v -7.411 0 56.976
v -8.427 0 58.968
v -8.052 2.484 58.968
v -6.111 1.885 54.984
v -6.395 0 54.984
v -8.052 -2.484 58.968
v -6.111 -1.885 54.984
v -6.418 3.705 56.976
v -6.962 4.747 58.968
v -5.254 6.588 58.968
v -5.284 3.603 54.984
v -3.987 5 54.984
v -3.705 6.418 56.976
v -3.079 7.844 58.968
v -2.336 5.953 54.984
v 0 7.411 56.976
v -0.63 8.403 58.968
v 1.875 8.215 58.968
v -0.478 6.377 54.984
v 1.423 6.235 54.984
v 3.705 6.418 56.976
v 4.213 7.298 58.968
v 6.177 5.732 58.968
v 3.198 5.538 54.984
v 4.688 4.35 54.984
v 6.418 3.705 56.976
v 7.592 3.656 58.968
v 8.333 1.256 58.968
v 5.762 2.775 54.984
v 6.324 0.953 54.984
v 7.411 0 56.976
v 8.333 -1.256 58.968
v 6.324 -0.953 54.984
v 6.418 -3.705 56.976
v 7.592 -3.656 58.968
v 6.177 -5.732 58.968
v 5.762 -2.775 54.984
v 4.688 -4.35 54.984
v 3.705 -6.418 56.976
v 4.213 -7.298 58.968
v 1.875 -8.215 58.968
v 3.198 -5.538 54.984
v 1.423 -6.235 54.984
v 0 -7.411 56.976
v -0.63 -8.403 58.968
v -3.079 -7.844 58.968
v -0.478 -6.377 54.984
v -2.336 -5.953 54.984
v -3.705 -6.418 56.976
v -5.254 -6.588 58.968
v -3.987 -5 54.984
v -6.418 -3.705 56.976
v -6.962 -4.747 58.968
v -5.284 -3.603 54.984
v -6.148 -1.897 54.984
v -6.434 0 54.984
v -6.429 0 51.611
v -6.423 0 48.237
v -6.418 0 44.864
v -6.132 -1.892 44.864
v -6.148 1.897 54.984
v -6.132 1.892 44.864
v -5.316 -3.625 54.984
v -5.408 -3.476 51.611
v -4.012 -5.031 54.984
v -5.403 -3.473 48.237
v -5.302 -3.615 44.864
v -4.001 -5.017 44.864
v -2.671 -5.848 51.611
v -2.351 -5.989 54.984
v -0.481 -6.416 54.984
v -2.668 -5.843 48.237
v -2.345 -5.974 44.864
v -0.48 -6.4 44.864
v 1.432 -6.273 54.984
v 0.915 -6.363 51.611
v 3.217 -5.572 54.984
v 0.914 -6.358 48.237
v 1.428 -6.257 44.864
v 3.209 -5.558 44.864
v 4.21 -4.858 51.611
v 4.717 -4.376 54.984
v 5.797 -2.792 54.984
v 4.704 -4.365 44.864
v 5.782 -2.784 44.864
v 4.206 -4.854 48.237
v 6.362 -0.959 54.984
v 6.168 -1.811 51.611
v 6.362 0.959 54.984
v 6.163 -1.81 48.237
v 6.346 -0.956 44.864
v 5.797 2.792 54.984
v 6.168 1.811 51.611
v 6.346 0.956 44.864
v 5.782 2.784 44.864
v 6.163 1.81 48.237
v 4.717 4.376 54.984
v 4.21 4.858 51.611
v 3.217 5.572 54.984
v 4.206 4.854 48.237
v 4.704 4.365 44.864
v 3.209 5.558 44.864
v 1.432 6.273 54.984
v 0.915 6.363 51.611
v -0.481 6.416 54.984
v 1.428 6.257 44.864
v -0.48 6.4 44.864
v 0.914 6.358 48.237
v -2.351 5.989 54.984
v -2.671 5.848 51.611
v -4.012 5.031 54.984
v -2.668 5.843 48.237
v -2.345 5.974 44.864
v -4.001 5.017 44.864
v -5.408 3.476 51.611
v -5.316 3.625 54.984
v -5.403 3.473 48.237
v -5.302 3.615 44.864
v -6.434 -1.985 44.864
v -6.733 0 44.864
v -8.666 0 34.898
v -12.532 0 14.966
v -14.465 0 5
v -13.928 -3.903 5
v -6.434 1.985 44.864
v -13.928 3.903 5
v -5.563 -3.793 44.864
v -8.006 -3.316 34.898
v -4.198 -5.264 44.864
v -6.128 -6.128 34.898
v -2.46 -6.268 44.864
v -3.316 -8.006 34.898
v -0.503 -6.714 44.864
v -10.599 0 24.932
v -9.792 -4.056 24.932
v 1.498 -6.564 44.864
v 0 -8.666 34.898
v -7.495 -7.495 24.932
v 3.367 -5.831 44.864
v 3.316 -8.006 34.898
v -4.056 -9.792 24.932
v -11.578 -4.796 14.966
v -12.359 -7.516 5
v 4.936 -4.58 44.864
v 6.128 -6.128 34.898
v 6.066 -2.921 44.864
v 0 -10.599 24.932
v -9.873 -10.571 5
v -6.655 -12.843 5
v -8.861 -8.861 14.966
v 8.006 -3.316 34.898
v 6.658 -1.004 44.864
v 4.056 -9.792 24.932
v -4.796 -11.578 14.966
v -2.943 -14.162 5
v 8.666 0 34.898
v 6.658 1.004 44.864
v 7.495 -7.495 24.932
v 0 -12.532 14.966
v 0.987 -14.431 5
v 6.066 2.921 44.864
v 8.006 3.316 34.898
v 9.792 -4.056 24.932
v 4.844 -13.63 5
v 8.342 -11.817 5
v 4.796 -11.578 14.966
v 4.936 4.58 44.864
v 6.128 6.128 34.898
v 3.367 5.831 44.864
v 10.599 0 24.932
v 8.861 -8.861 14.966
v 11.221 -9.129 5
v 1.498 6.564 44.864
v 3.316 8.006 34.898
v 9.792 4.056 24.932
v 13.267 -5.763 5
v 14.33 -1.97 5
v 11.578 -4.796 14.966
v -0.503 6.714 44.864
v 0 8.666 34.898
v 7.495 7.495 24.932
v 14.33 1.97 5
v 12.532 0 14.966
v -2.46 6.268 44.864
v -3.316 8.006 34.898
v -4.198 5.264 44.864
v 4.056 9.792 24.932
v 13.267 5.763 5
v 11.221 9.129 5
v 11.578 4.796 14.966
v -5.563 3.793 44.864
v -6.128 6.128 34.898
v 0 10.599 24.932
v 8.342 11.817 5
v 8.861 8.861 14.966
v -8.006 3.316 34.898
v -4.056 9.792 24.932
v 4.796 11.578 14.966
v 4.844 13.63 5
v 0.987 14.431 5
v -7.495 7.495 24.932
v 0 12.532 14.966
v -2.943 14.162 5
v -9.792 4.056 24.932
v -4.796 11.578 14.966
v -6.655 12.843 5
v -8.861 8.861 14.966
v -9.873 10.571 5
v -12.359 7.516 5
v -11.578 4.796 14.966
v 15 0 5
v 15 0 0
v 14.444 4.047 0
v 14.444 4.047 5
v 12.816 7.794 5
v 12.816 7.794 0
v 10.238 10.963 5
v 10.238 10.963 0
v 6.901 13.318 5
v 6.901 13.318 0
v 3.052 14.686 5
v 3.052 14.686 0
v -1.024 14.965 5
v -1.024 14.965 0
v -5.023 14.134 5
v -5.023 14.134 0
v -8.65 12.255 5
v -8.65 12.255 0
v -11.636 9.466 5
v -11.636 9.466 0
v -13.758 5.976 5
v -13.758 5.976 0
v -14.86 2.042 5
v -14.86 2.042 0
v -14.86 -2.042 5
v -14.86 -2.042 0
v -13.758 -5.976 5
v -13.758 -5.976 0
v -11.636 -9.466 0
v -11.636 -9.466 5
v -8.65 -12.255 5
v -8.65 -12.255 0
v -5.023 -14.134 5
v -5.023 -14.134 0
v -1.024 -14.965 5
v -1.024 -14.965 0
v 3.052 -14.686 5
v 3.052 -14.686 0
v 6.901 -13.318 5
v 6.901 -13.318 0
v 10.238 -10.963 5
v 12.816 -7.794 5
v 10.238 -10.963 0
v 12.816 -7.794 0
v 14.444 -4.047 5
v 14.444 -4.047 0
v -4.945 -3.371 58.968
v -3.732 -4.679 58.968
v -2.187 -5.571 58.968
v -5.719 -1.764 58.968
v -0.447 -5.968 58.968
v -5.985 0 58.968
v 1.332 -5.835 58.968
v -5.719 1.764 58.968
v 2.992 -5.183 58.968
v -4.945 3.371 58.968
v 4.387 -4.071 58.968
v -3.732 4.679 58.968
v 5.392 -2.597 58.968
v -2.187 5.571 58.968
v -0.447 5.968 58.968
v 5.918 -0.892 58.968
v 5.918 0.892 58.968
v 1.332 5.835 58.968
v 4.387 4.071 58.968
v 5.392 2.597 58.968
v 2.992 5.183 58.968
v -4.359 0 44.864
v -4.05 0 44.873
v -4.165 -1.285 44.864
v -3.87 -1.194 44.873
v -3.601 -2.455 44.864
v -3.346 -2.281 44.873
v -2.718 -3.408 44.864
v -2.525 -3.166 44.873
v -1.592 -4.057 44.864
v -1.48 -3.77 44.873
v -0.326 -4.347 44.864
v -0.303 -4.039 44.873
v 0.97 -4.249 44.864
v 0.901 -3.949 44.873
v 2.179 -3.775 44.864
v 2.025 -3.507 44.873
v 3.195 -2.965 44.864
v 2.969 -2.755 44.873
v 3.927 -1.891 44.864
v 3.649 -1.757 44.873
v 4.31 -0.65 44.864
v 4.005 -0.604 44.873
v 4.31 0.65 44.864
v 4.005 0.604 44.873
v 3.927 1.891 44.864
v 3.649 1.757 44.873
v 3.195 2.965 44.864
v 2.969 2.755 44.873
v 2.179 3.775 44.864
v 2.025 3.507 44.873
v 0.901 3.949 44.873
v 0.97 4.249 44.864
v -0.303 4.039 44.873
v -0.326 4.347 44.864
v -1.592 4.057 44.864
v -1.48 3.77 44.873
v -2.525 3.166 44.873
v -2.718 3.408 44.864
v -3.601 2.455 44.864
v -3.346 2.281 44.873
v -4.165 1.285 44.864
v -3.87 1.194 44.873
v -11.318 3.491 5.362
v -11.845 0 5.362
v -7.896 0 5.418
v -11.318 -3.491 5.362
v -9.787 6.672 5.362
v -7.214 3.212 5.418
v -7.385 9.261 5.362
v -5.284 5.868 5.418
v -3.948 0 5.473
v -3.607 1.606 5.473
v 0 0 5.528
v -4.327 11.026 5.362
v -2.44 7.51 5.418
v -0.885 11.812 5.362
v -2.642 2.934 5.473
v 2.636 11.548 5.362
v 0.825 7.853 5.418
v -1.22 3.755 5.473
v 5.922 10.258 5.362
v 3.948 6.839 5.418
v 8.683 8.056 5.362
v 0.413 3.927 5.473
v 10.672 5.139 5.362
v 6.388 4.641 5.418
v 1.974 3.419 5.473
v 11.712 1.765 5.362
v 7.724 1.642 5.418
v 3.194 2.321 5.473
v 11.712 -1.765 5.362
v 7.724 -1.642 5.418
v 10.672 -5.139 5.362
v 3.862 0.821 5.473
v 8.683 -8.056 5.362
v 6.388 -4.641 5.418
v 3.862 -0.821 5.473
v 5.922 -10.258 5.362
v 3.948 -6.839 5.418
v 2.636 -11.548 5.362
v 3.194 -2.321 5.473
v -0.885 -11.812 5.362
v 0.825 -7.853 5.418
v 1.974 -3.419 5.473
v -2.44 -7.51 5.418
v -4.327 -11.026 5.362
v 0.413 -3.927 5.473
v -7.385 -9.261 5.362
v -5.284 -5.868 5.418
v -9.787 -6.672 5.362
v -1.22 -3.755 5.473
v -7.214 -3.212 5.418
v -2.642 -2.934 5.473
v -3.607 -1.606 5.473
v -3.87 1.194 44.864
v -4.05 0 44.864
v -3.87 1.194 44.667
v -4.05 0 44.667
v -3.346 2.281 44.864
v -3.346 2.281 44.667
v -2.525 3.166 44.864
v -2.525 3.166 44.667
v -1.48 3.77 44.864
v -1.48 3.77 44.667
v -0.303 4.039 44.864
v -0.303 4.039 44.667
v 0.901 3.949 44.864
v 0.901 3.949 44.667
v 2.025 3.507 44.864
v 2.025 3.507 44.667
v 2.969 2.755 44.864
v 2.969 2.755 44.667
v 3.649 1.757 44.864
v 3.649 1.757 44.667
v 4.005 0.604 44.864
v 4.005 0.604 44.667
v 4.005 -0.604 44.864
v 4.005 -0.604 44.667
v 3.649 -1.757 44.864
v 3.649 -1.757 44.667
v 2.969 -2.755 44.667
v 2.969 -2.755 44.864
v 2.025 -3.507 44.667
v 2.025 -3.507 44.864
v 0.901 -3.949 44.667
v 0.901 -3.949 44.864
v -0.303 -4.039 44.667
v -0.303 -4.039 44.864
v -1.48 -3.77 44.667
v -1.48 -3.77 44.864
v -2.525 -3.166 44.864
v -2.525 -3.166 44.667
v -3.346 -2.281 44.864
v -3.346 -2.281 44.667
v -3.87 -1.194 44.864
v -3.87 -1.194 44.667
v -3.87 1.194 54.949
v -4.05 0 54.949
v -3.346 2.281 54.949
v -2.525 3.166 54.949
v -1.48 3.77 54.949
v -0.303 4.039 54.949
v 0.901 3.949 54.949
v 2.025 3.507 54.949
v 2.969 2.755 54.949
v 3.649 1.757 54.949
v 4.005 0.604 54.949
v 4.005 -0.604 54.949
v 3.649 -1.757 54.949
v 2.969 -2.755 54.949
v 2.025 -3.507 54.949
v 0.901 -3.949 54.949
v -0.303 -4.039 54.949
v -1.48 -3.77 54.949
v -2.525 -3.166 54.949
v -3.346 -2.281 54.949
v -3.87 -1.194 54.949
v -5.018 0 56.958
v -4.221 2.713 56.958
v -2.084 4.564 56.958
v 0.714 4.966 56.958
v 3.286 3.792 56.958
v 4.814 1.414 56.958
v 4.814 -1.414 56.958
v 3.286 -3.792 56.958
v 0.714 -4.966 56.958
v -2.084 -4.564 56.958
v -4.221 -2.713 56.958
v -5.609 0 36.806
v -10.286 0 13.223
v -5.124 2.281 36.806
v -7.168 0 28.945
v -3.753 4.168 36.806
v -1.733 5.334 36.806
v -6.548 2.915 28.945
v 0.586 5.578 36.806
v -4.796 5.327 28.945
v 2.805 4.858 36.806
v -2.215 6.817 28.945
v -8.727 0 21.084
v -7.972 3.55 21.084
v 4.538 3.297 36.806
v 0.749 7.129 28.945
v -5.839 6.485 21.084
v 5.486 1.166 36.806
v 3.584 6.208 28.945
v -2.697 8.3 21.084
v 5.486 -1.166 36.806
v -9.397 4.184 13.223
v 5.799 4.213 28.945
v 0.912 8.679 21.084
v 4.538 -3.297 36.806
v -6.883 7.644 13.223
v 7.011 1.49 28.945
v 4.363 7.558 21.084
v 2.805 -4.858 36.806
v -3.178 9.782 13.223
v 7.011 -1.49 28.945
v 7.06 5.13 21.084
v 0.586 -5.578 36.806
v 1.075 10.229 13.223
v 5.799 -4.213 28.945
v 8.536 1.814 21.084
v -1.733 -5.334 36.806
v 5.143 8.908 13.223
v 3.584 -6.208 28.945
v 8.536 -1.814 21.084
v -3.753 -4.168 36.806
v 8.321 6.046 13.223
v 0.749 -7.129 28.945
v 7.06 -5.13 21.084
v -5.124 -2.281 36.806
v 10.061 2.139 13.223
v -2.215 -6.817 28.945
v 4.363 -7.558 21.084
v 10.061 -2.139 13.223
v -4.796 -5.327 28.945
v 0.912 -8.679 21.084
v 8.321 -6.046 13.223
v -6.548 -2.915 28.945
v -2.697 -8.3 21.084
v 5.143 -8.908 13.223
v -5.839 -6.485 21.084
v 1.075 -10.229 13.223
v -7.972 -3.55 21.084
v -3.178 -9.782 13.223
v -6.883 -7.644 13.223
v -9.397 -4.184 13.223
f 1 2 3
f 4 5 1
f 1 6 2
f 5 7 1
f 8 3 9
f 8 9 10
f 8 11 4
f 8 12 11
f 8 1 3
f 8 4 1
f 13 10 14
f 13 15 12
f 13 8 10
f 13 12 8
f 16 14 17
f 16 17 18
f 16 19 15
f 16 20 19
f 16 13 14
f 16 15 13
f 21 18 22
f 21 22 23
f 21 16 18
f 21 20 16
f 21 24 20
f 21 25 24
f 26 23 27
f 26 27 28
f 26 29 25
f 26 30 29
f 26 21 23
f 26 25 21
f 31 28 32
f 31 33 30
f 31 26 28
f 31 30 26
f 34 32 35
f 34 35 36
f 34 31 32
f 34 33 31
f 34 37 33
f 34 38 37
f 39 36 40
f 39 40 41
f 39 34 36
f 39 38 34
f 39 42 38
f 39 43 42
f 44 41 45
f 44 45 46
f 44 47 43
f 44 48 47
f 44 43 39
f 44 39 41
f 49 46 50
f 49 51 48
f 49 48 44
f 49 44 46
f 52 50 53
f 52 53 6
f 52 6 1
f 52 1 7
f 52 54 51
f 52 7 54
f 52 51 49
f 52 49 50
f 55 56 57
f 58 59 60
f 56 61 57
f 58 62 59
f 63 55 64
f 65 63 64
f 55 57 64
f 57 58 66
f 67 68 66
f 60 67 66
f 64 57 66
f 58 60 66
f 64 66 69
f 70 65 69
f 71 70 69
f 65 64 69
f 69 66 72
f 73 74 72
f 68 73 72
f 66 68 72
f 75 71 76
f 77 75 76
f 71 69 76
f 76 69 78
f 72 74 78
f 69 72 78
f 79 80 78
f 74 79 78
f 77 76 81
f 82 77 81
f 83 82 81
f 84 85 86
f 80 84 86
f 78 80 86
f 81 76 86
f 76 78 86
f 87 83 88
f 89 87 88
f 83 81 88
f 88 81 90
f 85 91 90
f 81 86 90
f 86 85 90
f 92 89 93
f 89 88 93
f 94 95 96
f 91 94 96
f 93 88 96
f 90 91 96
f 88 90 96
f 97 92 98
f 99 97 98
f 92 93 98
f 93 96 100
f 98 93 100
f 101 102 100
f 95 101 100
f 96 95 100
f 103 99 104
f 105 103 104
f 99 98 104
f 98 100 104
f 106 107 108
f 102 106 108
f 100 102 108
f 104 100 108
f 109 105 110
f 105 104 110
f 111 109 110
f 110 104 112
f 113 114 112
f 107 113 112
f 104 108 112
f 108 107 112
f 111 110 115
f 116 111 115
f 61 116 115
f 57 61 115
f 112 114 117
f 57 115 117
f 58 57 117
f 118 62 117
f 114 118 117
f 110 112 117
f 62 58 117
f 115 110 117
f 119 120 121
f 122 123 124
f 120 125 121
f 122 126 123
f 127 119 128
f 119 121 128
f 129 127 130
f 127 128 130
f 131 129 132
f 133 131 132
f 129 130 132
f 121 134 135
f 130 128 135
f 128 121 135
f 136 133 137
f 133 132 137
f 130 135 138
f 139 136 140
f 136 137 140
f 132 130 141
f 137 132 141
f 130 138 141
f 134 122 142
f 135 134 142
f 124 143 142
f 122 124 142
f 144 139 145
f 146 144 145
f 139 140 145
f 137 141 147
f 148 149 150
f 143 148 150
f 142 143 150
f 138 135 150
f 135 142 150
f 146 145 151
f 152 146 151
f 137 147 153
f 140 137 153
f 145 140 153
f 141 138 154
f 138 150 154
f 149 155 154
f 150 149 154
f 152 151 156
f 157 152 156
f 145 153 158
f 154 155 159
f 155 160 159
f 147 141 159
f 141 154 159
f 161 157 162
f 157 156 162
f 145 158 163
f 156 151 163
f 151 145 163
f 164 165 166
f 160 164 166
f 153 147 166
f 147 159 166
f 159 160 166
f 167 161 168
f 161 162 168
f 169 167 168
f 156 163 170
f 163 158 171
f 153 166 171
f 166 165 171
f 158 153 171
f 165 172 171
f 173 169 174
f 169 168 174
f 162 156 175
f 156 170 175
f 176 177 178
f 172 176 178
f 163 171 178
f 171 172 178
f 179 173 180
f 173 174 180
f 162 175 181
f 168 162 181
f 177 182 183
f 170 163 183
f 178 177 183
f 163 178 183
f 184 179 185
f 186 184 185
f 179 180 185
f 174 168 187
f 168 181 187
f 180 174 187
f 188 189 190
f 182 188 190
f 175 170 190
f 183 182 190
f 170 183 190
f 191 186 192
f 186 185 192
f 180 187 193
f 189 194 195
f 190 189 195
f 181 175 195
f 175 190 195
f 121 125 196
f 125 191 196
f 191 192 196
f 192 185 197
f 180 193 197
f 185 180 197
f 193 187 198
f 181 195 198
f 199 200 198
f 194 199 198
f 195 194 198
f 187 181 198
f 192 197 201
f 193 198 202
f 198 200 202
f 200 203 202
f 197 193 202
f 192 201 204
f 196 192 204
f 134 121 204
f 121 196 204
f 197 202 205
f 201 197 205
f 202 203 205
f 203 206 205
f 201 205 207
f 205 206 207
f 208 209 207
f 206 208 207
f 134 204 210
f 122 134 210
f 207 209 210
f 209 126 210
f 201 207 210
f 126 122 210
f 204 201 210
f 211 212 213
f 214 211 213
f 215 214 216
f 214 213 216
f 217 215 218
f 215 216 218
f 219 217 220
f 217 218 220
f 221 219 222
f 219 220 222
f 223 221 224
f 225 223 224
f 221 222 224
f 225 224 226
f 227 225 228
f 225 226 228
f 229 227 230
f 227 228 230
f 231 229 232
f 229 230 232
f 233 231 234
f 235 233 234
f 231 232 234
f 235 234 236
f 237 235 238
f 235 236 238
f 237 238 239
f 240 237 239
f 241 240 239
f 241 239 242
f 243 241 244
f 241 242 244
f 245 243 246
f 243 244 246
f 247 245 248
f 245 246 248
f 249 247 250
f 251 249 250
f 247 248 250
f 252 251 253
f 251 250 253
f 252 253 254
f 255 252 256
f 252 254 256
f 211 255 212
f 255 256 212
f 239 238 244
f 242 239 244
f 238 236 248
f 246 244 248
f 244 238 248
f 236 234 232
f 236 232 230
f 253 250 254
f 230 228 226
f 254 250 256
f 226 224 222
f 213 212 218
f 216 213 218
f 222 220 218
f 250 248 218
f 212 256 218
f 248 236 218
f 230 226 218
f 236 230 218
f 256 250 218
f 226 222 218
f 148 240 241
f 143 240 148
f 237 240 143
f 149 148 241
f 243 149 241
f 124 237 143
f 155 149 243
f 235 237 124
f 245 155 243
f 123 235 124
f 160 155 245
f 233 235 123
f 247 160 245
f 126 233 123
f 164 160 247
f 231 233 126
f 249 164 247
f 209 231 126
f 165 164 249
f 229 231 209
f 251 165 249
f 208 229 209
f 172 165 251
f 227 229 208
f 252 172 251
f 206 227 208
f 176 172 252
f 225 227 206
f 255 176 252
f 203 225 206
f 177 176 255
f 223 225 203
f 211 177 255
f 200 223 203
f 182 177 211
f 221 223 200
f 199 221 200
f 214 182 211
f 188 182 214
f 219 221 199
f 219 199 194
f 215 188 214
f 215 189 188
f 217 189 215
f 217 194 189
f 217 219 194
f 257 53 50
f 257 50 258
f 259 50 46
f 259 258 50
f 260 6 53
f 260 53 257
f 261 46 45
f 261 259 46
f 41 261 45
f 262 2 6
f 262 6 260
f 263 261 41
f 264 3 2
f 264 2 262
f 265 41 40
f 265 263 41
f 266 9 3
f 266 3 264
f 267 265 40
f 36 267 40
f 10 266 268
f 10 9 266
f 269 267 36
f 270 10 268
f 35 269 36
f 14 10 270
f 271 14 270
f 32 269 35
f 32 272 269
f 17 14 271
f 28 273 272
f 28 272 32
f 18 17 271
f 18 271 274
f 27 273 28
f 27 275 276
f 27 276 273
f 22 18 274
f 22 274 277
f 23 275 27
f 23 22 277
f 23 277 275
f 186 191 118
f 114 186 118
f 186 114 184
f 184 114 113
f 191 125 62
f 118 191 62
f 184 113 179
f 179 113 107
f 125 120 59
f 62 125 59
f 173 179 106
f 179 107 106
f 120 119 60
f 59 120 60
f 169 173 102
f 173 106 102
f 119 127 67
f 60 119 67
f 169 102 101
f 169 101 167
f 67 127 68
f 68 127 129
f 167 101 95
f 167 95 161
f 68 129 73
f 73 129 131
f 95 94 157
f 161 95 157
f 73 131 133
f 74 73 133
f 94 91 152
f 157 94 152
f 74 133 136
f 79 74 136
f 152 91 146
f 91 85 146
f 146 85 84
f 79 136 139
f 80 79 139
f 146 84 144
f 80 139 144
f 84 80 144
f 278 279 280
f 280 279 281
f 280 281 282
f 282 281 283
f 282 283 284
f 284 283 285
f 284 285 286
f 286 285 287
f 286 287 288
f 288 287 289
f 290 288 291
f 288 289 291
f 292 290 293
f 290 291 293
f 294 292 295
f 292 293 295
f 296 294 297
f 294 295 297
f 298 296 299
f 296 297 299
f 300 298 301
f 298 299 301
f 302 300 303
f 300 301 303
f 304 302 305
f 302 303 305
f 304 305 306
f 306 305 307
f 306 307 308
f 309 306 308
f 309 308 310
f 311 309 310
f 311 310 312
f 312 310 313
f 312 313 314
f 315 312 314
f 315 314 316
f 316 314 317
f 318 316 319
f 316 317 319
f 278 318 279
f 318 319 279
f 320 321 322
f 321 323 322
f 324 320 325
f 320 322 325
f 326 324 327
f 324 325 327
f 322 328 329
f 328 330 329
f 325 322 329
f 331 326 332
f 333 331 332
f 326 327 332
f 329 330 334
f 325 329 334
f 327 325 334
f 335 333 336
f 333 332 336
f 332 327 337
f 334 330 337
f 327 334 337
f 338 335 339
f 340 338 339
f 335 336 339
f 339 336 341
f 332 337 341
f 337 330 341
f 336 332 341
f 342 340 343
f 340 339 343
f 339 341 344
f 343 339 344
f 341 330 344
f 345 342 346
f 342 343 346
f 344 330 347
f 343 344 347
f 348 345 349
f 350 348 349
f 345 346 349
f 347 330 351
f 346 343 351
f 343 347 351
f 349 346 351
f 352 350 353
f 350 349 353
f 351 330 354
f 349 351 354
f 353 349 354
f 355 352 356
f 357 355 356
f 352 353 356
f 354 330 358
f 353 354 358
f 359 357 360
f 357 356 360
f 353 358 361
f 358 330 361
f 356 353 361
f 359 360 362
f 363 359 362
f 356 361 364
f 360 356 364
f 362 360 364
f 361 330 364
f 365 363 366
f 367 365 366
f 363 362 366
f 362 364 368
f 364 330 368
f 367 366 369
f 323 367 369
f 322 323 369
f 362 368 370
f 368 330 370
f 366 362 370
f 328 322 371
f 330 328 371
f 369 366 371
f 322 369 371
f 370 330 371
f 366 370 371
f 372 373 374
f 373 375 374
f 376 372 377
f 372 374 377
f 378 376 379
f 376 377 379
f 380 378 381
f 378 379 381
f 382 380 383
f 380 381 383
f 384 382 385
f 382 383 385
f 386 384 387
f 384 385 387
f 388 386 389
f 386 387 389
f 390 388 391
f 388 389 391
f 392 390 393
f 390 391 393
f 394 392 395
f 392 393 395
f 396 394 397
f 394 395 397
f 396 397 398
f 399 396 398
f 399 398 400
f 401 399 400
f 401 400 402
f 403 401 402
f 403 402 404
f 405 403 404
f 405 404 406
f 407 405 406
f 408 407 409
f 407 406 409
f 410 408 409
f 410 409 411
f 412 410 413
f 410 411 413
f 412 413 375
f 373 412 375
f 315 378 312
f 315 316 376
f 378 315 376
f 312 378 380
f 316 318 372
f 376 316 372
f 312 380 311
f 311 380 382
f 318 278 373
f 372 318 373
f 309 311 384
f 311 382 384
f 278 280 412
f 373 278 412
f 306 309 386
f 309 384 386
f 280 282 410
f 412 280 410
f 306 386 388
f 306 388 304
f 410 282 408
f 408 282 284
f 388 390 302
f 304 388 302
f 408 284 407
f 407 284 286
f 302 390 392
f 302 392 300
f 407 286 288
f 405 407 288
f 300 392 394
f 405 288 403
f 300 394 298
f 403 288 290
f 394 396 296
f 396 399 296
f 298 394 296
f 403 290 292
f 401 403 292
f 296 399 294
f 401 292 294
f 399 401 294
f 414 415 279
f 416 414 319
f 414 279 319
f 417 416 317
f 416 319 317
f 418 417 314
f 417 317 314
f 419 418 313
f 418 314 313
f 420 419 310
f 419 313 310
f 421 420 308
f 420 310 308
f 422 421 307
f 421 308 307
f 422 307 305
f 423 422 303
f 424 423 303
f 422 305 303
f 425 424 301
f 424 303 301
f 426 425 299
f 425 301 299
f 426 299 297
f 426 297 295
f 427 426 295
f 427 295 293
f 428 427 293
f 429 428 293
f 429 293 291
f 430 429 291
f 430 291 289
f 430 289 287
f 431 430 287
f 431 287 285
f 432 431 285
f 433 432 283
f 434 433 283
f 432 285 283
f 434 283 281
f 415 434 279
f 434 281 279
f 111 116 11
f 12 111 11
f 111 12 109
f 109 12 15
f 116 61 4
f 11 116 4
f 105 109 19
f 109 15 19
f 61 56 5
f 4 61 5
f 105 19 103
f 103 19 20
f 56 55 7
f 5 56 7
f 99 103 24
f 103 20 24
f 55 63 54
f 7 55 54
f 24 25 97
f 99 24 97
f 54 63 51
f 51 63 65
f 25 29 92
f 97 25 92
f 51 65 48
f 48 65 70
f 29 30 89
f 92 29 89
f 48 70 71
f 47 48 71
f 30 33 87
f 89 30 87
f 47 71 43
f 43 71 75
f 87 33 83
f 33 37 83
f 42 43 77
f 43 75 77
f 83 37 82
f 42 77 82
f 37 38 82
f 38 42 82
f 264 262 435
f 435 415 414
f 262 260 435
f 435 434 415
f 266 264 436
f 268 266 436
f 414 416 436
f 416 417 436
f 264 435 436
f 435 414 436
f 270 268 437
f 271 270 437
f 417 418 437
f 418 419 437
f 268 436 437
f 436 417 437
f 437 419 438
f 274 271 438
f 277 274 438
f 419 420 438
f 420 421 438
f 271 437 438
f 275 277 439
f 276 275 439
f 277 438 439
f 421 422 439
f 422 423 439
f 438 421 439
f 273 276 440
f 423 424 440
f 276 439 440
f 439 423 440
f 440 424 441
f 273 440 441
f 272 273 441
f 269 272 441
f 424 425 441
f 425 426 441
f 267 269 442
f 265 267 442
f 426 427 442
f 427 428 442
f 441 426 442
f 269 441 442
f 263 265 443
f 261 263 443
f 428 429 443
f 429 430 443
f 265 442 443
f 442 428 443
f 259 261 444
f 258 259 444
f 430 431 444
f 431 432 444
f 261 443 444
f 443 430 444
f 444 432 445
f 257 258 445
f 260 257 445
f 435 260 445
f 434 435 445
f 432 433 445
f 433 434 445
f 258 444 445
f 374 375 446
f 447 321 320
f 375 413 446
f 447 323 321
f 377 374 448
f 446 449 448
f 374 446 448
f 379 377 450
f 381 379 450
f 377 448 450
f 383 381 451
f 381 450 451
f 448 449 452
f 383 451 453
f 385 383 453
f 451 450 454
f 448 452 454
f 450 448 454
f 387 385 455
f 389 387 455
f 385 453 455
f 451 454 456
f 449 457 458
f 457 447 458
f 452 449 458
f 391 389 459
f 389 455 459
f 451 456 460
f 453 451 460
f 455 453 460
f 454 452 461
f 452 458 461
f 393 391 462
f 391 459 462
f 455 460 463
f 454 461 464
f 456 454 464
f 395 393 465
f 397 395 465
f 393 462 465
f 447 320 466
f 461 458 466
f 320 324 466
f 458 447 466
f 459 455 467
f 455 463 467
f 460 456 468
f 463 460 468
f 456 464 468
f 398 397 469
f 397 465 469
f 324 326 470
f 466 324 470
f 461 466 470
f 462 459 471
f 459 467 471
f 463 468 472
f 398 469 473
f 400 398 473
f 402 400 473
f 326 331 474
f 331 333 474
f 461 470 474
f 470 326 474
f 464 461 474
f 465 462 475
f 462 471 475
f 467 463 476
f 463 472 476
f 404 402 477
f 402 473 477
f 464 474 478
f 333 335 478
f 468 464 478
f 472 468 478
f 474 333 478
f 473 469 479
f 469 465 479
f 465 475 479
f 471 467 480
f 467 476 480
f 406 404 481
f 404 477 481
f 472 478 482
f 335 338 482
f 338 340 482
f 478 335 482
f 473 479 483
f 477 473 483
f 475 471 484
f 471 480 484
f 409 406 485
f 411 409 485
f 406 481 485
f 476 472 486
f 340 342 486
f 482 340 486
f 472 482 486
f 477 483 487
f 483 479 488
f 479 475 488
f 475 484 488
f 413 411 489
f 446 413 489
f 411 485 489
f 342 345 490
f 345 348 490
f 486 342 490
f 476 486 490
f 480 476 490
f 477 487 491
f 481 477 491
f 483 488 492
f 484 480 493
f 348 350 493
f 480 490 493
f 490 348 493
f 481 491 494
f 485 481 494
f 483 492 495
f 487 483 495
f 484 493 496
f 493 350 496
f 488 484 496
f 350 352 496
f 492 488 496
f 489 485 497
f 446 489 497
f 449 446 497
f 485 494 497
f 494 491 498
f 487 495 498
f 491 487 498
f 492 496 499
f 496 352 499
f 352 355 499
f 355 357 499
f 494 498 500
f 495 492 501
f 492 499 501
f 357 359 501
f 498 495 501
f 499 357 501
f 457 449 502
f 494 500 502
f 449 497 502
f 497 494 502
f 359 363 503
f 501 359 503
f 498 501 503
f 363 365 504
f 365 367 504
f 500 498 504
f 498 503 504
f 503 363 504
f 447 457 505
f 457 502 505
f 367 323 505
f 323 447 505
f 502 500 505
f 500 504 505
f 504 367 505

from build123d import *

# Parameters (mm, degrees)
F0_R     = 15
F1_DEPTH = 5


with BuildPart() as f1:
    # F0 (on Top) → F1 (new body)
    with BuildSketch(Plane.XY):
        Circle(F0_R)
    extrude(amount=F1_DEPTH)

    # F2 (on Front) → F3 (revolve)
    with BuildSketch(Plane.XZ):
        Polygon((-14.491172, 4.864085), (0, 4.864085), (0, 44.864085), (-6.733272, 44.864085), align=None)
    revolve(axis=Axis((0, 0, 24.864085), (0, 0, 1)))

    # F4 (on Front) → F5 (revolve)
    with BuildSketch(Plane.XZ):
        Polygon((-6.417496, 44.807569), (0, 44.983736), (0, 54.983736), (-6.434252, 54.983736), align=None)
    revolve(axis=Axis((0, 0, 49.983736), (0, 0, 1)))

    # F6 (on Front) → F7 (revolve)
    with BuildSketch(Plane.XZ):
        Polygon((-8.426686, 58.967727), (-6.387146, 54.967727), (0, 54.967727), (0, 58.967727), align=None)
    revolve(axis=Axis((0, 0, 56.967727), (0, 0, -1)))

    # F8 (on Front) → F9 (revolve, cut)
    with BuildSketch(Plane.XZ):
        Polygon((-4.05009, 44.66689), (-11.844673, 5.362289), (0, 5.528131), (0, 59.371449), (-6.179371, 59.371449), (-4.05009, 54.949105), align=None)
    revolve(axis=Axis((0, 0, 32.44979), (0, 0, -1)), mode=Mode.SUBTRACT)


solid = f1.part
